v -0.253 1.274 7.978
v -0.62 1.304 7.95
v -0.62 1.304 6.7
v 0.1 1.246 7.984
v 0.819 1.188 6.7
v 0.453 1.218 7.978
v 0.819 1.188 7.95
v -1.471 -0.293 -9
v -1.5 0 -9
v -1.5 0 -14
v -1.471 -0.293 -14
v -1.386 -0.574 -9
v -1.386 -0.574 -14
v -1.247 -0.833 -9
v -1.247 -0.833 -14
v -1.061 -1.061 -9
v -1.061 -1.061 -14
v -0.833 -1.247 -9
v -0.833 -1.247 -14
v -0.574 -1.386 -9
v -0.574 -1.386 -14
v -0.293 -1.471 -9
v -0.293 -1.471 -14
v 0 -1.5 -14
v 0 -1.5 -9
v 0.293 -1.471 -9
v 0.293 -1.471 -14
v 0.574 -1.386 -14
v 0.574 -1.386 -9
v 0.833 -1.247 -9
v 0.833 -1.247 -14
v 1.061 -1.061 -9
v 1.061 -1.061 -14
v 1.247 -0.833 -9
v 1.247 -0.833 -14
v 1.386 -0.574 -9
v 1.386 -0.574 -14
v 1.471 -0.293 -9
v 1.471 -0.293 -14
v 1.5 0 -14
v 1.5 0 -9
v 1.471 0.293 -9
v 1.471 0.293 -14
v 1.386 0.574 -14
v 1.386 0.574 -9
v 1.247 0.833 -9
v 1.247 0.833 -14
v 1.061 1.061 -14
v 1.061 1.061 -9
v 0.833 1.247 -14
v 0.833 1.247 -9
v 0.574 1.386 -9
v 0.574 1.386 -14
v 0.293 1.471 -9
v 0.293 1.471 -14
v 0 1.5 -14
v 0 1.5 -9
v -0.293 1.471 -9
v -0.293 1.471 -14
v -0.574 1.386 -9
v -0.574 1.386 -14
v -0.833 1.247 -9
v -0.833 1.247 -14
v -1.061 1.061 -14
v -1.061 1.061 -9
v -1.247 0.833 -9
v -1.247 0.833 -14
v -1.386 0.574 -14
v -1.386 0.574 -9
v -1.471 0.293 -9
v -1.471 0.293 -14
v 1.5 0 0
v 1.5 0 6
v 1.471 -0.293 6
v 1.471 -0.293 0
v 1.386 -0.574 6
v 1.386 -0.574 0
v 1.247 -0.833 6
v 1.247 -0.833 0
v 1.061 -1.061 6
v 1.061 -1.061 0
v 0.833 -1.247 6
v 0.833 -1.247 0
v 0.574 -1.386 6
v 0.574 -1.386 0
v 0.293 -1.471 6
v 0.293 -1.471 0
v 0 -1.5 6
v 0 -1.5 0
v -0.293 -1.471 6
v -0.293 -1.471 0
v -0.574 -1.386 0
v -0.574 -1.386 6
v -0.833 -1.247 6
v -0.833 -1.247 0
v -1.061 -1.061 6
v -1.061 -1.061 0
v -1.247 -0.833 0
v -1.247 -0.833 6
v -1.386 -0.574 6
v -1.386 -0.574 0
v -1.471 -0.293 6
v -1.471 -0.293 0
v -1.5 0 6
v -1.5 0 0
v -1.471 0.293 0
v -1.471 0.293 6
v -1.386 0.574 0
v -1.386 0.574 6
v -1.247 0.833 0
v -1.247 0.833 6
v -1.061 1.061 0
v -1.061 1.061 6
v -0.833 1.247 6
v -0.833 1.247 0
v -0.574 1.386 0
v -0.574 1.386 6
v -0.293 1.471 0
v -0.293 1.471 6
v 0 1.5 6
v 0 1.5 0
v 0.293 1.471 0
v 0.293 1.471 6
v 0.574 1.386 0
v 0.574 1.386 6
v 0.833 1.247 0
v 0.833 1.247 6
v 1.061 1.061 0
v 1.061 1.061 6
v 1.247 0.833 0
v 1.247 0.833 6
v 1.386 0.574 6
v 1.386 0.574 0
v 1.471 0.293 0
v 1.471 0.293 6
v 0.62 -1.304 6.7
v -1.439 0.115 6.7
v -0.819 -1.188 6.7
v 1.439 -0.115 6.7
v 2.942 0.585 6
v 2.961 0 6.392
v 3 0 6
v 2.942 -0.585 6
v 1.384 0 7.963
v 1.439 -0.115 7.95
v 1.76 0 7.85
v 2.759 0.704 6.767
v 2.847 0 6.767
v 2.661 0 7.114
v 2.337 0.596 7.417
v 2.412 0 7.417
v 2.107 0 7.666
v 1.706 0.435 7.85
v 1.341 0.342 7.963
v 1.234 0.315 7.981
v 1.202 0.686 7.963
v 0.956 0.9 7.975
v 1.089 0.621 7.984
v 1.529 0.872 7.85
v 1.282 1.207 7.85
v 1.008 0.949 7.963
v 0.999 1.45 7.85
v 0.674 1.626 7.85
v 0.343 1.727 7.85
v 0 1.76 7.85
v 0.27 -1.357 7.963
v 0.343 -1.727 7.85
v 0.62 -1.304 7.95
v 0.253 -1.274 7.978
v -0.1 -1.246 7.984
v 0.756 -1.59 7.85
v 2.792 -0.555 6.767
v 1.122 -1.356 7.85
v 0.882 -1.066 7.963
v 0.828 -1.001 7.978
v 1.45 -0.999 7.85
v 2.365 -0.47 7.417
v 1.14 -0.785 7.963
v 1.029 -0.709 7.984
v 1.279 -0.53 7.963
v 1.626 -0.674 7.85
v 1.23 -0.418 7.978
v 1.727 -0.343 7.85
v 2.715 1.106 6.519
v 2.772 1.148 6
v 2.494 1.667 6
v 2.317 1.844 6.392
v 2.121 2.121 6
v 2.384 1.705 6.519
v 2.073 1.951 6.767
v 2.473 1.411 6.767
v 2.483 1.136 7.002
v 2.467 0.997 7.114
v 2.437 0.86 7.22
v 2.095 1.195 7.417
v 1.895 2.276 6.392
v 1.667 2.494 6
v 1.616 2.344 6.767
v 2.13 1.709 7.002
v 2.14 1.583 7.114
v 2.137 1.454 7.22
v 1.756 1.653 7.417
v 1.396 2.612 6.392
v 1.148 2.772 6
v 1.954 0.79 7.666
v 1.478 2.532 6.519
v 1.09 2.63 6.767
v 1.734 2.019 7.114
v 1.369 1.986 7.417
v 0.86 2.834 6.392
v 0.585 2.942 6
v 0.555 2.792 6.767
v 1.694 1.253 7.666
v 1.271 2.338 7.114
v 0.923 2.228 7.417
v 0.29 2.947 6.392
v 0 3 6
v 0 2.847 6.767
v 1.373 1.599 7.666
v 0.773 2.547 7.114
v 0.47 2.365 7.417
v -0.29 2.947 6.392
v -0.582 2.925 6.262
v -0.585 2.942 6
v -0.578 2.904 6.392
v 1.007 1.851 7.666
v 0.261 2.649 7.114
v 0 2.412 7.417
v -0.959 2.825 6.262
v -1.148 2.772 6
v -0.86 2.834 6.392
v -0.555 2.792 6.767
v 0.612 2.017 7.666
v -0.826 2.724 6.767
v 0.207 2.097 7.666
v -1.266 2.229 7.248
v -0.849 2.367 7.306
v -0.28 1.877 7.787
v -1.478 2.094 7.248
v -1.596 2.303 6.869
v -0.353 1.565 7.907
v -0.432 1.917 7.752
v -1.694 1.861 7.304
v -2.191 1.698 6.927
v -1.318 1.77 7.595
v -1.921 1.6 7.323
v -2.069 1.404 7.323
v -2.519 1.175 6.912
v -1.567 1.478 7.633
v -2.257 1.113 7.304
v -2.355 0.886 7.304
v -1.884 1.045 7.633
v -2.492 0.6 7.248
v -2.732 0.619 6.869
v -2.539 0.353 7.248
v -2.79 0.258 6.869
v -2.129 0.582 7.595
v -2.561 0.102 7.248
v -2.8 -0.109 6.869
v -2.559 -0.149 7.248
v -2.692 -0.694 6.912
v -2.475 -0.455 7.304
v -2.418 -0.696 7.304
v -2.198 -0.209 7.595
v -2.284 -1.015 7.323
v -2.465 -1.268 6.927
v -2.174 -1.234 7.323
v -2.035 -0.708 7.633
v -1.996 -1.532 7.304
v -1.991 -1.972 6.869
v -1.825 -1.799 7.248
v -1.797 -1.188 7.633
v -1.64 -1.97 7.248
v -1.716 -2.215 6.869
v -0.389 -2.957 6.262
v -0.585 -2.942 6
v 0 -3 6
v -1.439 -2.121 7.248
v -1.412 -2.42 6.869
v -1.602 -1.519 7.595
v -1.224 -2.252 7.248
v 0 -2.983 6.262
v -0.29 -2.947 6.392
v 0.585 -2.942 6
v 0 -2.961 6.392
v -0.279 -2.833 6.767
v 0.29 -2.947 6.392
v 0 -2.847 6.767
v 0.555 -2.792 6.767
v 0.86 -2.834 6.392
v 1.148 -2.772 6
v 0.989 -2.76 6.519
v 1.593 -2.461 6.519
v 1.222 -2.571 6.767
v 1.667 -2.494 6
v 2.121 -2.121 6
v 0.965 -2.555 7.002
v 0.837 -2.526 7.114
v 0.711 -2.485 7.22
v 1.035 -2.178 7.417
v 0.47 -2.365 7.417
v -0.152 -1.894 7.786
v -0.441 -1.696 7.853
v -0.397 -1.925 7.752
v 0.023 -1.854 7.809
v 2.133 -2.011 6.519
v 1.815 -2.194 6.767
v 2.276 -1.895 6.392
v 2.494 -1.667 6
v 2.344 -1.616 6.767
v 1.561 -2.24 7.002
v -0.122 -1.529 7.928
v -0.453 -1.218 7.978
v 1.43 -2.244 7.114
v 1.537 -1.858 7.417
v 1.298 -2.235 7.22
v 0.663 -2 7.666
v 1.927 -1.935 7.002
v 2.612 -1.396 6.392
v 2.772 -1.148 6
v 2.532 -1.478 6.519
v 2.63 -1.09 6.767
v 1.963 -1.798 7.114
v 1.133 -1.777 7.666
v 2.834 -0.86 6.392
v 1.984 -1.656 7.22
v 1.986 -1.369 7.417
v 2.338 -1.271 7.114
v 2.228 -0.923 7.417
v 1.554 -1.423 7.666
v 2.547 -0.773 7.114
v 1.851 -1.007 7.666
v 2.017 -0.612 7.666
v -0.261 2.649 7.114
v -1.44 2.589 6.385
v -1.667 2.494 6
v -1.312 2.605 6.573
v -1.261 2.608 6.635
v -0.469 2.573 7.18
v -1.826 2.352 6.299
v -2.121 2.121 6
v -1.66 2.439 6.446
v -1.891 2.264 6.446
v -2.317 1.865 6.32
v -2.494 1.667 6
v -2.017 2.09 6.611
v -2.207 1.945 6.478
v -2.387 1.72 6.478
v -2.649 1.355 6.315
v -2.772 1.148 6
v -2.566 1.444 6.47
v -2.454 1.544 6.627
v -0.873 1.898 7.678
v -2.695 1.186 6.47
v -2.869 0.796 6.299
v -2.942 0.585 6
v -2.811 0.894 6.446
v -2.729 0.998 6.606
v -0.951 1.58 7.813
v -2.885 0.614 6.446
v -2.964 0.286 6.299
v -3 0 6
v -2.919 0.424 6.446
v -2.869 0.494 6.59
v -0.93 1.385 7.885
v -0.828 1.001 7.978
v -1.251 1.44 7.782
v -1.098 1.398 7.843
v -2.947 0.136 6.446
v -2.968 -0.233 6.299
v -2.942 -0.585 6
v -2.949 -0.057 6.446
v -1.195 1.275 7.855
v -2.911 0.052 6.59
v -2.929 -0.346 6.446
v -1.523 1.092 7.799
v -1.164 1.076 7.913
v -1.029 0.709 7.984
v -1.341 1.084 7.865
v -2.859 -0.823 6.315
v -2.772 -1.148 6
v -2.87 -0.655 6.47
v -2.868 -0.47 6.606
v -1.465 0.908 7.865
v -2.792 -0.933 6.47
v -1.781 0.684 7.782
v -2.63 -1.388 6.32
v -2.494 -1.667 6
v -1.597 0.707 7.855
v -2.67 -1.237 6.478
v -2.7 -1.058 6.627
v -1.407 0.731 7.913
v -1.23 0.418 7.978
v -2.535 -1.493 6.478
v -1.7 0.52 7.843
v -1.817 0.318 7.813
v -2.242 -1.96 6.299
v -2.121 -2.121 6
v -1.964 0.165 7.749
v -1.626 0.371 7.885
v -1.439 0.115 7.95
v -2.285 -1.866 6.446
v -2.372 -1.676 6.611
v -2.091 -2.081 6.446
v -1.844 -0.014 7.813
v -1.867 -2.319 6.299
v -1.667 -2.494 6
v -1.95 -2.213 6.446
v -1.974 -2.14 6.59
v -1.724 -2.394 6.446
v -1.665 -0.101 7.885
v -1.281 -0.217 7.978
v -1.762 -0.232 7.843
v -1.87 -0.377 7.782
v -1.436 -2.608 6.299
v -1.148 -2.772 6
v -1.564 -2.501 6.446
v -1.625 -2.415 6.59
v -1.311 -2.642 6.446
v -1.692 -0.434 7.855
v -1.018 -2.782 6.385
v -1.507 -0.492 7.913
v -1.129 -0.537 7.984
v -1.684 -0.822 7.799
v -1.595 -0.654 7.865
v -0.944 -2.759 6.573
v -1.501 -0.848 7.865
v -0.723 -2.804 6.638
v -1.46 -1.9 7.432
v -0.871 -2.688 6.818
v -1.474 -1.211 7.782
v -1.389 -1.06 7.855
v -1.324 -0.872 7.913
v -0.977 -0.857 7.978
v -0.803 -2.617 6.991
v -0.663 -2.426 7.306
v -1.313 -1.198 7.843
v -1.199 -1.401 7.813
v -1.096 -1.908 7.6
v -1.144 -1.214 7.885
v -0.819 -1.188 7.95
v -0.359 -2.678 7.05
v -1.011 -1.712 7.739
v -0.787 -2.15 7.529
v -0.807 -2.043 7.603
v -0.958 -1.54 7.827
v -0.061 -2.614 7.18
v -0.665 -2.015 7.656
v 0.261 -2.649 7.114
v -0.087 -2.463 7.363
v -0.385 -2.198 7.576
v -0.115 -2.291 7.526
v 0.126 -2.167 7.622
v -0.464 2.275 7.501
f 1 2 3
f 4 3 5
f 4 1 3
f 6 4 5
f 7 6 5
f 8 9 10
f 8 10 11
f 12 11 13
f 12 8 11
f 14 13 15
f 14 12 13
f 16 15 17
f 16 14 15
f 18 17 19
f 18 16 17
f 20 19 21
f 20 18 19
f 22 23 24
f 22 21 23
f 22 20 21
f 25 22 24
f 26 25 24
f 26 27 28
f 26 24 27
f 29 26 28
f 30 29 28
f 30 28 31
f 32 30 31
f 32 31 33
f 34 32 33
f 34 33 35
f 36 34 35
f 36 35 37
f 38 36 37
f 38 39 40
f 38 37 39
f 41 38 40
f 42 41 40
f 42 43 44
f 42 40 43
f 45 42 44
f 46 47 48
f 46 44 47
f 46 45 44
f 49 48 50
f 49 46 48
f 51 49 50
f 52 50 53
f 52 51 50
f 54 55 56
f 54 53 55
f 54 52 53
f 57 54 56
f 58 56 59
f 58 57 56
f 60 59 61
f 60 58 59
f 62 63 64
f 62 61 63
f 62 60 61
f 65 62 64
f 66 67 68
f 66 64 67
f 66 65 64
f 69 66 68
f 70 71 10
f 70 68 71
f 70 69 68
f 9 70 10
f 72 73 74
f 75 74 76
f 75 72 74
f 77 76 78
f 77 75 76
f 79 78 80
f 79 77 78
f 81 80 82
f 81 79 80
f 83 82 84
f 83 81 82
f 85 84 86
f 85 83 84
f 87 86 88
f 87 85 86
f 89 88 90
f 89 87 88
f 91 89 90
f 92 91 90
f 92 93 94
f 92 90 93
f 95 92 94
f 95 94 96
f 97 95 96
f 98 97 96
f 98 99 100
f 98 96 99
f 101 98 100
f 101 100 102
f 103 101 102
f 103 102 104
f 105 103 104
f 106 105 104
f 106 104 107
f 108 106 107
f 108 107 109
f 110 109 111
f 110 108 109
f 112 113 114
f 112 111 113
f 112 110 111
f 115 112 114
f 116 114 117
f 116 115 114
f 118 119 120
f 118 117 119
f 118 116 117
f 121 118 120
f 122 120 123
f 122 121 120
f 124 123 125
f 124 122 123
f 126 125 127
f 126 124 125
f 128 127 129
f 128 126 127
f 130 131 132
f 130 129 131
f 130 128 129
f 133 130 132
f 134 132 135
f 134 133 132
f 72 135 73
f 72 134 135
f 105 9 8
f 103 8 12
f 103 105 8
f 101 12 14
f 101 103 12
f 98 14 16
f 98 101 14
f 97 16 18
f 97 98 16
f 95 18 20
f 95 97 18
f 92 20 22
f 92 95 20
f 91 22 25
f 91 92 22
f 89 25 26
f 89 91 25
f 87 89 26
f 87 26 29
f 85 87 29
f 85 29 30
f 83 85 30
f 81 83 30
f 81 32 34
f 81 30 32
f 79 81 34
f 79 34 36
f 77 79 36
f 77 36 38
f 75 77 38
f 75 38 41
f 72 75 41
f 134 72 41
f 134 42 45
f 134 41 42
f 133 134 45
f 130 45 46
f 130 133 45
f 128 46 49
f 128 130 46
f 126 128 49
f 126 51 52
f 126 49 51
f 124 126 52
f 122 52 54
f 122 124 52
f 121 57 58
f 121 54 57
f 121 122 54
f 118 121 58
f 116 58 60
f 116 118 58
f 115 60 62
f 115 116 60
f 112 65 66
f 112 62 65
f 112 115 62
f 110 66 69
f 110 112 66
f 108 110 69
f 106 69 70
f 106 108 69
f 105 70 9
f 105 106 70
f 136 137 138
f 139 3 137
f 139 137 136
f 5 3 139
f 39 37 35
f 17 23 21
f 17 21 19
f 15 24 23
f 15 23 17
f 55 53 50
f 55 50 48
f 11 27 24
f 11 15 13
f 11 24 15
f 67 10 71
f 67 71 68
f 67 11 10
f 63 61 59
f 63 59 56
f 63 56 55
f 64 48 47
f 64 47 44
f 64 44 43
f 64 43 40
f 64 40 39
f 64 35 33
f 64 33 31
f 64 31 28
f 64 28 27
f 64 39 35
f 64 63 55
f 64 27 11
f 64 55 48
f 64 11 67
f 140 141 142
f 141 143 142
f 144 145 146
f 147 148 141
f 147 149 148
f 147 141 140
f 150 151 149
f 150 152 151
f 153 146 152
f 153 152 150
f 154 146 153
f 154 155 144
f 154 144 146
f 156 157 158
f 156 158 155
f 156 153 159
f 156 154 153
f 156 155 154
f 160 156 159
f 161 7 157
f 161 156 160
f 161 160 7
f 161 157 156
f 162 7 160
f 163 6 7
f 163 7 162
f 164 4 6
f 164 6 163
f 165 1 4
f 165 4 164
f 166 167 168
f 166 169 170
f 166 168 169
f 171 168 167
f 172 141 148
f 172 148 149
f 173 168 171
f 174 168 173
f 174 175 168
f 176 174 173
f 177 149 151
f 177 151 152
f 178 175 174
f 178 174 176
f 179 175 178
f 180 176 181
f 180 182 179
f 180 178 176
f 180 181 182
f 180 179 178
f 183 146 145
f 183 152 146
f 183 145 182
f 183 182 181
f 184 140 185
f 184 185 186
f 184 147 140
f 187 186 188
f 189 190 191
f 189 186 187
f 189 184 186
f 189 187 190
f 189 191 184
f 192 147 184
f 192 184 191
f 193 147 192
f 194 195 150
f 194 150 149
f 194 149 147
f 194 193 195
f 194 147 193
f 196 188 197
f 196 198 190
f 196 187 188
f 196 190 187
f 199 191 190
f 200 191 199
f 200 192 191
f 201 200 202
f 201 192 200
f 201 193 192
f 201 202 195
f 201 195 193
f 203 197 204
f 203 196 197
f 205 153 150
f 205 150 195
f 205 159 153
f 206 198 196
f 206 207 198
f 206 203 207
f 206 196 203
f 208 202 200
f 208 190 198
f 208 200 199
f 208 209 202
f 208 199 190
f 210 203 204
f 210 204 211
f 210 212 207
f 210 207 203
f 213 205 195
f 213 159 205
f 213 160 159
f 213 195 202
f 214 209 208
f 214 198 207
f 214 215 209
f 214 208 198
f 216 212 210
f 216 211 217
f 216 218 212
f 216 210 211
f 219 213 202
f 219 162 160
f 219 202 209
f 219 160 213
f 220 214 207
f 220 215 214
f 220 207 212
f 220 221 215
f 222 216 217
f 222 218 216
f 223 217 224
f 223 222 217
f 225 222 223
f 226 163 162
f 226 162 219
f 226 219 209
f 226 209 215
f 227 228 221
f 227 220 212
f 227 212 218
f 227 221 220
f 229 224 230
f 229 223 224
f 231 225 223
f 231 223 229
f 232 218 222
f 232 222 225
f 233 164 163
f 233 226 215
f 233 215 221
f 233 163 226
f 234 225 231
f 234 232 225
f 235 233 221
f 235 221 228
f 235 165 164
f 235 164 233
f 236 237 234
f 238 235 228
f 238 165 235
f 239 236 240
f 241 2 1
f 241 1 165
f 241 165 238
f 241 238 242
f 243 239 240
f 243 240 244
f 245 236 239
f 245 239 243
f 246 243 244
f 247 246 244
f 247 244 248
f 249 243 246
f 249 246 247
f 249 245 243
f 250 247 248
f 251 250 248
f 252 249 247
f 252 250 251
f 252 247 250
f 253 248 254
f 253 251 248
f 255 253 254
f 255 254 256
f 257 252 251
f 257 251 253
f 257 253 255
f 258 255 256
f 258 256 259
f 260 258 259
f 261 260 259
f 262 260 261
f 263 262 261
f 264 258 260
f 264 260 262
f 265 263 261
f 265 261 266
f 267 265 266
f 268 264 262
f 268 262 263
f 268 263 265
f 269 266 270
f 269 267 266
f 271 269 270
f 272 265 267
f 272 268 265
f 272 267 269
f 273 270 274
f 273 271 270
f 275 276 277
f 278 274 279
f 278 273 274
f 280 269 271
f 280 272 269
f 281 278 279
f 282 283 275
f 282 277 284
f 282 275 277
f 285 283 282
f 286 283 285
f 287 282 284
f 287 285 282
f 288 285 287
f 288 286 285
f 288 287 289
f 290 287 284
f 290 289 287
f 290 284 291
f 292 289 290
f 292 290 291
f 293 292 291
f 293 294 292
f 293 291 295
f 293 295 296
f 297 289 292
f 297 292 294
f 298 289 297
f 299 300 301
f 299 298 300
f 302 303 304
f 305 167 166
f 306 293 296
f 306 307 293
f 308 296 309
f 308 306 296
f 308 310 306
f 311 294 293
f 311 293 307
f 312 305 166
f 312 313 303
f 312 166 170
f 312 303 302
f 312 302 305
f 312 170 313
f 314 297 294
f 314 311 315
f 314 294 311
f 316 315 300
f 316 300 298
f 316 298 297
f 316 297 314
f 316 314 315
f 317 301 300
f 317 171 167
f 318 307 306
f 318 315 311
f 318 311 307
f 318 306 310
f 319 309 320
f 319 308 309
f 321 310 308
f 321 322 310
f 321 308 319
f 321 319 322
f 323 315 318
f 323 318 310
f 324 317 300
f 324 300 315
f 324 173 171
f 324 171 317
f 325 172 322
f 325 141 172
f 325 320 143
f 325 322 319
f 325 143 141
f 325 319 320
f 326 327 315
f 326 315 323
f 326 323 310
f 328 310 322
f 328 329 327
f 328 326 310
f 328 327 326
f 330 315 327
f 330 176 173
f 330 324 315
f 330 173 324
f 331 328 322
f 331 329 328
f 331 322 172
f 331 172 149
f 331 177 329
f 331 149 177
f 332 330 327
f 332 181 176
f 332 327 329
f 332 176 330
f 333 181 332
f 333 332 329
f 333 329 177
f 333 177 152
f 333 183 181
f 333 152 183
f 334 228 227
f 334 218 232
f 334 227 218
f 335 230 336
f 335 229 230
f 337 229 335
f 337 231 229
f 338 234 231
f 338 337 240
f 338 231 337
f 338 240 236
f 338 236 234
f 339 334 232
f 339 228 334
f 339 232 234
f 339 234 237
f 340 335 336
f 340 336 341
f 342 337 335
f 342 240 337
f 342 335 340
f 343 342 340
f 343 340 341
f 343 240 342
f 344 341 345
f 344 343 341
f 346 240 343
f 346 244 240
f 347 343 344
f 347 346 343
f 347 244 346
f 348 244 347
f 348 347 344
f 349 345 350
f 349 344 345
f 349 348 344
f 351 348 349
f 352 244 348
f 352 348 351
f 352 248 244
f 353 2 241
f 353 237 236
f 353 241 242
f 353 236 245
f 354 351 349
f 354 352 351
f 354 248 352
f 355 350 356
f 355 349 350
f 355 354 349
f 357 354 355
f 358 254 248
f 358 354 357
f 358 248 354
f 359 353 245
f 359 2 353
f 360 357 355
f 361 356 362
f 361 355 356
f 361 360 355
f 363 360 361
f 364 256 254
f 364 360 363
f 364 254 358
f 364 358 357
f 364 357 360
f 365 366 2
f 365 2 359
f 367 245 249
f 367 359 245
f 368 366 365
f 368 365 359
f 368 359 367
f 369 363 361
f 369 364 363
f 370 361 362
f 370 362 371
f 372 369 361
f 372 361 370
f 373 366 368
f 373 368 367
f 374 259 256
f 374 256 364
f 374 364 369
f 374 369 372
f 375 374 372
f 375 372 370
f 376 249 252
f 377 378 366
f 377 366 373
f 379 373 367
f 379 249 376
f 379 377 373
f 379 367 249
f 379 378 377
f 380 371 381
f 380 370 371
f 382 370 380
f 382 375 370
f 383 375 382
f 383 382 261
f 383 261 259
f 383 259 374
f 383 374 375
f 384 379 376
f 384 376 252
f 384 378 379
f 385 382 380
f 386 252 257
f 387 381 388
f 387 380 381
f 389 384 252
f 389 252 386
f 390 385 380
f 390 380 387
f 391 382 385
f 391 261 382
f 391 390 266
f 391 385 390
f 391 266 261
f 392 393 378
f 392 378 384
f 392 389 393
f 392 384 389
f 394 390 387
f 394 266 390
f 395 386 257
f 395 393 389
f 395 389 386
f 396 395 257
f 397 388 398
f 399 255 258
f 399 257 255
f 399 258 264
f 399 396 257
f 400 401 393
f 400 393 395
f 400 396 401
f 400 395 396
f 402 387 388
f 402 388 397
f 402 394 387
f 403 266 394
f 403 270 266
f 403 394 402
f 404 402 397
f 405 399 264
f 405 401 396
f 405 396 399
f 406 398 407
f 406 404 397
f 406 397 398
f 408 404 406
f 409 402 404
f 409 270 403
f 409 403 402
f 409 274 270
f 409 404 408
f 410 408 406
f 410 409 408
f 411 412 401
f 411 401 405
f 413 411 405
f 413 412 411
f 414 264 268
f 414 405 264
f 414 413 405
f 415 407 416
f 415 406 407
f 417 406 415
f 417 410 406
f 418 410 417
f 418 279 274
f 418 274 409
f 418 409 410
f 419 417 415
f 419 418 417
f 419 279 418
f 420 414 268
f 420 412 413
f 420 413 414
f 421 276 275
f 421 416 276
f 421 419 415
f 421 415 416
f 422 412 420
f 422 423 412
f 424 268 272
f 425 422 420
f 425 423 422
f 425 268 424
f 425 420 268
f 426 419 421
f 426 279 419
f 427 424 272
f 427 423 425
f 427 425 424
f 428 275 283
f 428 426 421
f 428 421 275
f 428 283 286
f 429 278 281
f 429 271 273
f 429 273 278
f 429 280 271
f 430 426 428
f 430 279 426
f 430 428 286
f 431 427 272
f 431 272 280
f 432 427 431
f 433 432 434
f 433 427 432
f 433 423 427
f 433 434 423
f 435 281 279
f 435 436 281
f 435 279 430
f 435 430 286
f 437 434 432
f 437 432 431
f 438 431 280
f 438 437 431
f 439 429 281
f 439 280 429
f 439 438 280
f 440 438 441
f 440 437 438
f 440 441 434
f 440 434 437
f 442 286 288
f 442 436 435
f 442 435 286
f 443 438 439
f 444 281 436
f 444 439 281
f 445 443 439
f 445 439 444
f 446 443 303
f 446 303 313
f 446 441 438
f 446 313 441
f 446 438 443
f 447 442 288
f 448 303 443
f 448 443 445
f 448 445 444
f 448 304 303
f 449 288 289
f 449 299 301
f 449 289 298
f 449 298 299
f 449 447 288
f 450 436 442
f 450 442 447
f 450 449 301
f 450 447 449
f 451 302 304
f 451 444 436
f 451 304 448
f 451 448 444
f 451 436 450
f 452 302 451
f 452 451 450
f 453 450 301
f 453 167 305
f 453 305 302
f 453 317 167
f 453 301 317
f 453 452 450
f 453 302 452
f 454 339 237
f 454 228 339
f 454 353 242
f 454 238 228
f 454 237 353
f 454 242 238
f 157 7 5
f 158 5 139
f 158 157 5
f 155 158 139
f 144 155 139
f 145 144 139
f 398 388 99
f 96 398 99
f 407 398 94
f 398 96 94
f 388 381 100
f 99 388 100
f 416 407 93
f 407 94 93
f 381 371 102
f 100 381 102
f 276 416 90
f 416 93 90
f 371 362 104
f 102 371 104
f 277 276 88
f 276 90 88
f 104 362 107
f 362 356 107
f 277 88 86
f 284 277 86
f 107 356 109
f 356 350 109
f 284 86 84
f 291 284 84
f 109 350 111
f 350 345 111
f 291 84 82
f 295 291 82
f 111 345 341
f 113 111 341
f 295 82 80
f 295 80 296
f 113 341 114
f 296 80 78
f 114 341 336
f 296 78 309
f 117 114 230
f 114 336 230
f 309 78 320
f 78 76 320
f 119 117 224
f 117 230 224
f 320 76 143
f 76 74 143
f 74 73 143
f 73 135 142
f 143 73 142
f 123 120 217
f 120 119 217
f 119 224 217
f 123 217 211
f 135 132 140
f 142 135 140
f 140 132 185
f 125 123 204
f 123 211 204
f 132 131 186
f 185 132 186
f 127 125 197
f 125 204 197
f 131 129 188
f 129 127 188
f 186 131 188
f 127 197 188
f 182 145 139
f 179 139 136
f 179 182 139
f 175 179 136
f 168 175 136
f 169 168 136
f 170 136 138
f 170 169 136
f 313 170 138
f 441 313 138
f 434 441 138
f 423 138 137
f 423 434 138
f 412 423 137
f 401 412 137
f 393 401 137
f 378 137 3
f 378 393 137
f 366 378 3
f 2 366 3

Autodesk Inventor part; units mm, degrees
ref_plane "YZ Plane" through (0, 0, 0) normal (1, 0, 0) x (0, 1, 0)
ref_plane "XZ Plane" through (0, 0, 0) normal (0, 1, 0) x (-1, 0, 0)
ref_plane "XY Plane" through (0, 0, 0) normal (0, 0, 1) x (1, 0, 0)
sketch "スケッチ1" plane through (0, 0, 0) normal (0, 0, 1) x (1, 0, 0)
  circle A0 centre (0, 0) radius 1.5
  dimension "d0" = 3
extrude "押し出し1" add sketch "スケッチ1" along normal blind 6
sketch "スケッチ2" plane through (0, 0, 6) normal (0, 0, 1) x (1, 0, 0)
  circle A0 centre (0, 0) radius 1.5 projected
  circle A1 centre (0, 0) radius 3
  dimension "d3" = 6
extrude "押し出し2" add sketch "スケッチ2" along normal blind 2 contours A0 | A1
fillet "フィレット1" radius 2 1 edges at (-3, 0, 8)
thread "ねじ1" size "M3x0.5" class "6g" standard "ANSI Metric M Profile" full length
sketch "スケッチ3" plane through (0, 0, 0) normal (0, 0, -1) x (-1, 0, 0)
  circle A0 centre (0, 0) radius 1.5 projected
extrude "押し出し3" add sketch "スケッチ3" along normal blind 9
sketch "スケッチ4" plane through (0, 0, -9) normal (0, 0, -1) x (-1, 0, 0)
  circle A0 centre (0, 0) radius 1.5 projected
extrude "押し出し4" add sketch "スケッチ4" along normal blind 5
sketch "スケッチ5" plane through (0, 0, 8) normal (0, 0, 1) x (1, 0, 0)
  line L0 (0.8191, 1.1885) -> (1.4388, -0.1151)
  line L1 (1.4388, -0.1151) -> (0.6197, -1.3036)
  line L2 (0.6197, -1.3036) -> (-0.8191, -1.1885)
  line L3 (-0.8191, -1.1885) -> (-1.4388, 0.1151)
  line L4 (-1.4388, 0.1151) -> (-0.6197, 1.3036)
  line L5 (-0.6197, 1.3036) -> (0.8191, 1.1885)
  point P0 (0, 0)
  point P1 (0, 0)
  dimension "d13" = 2.5
extrude "押し出し5" cut sketch "スケッチ5" against normal blind 1.3
properties part number "SB　20mmなべネジ" material "Steel, Mild"
